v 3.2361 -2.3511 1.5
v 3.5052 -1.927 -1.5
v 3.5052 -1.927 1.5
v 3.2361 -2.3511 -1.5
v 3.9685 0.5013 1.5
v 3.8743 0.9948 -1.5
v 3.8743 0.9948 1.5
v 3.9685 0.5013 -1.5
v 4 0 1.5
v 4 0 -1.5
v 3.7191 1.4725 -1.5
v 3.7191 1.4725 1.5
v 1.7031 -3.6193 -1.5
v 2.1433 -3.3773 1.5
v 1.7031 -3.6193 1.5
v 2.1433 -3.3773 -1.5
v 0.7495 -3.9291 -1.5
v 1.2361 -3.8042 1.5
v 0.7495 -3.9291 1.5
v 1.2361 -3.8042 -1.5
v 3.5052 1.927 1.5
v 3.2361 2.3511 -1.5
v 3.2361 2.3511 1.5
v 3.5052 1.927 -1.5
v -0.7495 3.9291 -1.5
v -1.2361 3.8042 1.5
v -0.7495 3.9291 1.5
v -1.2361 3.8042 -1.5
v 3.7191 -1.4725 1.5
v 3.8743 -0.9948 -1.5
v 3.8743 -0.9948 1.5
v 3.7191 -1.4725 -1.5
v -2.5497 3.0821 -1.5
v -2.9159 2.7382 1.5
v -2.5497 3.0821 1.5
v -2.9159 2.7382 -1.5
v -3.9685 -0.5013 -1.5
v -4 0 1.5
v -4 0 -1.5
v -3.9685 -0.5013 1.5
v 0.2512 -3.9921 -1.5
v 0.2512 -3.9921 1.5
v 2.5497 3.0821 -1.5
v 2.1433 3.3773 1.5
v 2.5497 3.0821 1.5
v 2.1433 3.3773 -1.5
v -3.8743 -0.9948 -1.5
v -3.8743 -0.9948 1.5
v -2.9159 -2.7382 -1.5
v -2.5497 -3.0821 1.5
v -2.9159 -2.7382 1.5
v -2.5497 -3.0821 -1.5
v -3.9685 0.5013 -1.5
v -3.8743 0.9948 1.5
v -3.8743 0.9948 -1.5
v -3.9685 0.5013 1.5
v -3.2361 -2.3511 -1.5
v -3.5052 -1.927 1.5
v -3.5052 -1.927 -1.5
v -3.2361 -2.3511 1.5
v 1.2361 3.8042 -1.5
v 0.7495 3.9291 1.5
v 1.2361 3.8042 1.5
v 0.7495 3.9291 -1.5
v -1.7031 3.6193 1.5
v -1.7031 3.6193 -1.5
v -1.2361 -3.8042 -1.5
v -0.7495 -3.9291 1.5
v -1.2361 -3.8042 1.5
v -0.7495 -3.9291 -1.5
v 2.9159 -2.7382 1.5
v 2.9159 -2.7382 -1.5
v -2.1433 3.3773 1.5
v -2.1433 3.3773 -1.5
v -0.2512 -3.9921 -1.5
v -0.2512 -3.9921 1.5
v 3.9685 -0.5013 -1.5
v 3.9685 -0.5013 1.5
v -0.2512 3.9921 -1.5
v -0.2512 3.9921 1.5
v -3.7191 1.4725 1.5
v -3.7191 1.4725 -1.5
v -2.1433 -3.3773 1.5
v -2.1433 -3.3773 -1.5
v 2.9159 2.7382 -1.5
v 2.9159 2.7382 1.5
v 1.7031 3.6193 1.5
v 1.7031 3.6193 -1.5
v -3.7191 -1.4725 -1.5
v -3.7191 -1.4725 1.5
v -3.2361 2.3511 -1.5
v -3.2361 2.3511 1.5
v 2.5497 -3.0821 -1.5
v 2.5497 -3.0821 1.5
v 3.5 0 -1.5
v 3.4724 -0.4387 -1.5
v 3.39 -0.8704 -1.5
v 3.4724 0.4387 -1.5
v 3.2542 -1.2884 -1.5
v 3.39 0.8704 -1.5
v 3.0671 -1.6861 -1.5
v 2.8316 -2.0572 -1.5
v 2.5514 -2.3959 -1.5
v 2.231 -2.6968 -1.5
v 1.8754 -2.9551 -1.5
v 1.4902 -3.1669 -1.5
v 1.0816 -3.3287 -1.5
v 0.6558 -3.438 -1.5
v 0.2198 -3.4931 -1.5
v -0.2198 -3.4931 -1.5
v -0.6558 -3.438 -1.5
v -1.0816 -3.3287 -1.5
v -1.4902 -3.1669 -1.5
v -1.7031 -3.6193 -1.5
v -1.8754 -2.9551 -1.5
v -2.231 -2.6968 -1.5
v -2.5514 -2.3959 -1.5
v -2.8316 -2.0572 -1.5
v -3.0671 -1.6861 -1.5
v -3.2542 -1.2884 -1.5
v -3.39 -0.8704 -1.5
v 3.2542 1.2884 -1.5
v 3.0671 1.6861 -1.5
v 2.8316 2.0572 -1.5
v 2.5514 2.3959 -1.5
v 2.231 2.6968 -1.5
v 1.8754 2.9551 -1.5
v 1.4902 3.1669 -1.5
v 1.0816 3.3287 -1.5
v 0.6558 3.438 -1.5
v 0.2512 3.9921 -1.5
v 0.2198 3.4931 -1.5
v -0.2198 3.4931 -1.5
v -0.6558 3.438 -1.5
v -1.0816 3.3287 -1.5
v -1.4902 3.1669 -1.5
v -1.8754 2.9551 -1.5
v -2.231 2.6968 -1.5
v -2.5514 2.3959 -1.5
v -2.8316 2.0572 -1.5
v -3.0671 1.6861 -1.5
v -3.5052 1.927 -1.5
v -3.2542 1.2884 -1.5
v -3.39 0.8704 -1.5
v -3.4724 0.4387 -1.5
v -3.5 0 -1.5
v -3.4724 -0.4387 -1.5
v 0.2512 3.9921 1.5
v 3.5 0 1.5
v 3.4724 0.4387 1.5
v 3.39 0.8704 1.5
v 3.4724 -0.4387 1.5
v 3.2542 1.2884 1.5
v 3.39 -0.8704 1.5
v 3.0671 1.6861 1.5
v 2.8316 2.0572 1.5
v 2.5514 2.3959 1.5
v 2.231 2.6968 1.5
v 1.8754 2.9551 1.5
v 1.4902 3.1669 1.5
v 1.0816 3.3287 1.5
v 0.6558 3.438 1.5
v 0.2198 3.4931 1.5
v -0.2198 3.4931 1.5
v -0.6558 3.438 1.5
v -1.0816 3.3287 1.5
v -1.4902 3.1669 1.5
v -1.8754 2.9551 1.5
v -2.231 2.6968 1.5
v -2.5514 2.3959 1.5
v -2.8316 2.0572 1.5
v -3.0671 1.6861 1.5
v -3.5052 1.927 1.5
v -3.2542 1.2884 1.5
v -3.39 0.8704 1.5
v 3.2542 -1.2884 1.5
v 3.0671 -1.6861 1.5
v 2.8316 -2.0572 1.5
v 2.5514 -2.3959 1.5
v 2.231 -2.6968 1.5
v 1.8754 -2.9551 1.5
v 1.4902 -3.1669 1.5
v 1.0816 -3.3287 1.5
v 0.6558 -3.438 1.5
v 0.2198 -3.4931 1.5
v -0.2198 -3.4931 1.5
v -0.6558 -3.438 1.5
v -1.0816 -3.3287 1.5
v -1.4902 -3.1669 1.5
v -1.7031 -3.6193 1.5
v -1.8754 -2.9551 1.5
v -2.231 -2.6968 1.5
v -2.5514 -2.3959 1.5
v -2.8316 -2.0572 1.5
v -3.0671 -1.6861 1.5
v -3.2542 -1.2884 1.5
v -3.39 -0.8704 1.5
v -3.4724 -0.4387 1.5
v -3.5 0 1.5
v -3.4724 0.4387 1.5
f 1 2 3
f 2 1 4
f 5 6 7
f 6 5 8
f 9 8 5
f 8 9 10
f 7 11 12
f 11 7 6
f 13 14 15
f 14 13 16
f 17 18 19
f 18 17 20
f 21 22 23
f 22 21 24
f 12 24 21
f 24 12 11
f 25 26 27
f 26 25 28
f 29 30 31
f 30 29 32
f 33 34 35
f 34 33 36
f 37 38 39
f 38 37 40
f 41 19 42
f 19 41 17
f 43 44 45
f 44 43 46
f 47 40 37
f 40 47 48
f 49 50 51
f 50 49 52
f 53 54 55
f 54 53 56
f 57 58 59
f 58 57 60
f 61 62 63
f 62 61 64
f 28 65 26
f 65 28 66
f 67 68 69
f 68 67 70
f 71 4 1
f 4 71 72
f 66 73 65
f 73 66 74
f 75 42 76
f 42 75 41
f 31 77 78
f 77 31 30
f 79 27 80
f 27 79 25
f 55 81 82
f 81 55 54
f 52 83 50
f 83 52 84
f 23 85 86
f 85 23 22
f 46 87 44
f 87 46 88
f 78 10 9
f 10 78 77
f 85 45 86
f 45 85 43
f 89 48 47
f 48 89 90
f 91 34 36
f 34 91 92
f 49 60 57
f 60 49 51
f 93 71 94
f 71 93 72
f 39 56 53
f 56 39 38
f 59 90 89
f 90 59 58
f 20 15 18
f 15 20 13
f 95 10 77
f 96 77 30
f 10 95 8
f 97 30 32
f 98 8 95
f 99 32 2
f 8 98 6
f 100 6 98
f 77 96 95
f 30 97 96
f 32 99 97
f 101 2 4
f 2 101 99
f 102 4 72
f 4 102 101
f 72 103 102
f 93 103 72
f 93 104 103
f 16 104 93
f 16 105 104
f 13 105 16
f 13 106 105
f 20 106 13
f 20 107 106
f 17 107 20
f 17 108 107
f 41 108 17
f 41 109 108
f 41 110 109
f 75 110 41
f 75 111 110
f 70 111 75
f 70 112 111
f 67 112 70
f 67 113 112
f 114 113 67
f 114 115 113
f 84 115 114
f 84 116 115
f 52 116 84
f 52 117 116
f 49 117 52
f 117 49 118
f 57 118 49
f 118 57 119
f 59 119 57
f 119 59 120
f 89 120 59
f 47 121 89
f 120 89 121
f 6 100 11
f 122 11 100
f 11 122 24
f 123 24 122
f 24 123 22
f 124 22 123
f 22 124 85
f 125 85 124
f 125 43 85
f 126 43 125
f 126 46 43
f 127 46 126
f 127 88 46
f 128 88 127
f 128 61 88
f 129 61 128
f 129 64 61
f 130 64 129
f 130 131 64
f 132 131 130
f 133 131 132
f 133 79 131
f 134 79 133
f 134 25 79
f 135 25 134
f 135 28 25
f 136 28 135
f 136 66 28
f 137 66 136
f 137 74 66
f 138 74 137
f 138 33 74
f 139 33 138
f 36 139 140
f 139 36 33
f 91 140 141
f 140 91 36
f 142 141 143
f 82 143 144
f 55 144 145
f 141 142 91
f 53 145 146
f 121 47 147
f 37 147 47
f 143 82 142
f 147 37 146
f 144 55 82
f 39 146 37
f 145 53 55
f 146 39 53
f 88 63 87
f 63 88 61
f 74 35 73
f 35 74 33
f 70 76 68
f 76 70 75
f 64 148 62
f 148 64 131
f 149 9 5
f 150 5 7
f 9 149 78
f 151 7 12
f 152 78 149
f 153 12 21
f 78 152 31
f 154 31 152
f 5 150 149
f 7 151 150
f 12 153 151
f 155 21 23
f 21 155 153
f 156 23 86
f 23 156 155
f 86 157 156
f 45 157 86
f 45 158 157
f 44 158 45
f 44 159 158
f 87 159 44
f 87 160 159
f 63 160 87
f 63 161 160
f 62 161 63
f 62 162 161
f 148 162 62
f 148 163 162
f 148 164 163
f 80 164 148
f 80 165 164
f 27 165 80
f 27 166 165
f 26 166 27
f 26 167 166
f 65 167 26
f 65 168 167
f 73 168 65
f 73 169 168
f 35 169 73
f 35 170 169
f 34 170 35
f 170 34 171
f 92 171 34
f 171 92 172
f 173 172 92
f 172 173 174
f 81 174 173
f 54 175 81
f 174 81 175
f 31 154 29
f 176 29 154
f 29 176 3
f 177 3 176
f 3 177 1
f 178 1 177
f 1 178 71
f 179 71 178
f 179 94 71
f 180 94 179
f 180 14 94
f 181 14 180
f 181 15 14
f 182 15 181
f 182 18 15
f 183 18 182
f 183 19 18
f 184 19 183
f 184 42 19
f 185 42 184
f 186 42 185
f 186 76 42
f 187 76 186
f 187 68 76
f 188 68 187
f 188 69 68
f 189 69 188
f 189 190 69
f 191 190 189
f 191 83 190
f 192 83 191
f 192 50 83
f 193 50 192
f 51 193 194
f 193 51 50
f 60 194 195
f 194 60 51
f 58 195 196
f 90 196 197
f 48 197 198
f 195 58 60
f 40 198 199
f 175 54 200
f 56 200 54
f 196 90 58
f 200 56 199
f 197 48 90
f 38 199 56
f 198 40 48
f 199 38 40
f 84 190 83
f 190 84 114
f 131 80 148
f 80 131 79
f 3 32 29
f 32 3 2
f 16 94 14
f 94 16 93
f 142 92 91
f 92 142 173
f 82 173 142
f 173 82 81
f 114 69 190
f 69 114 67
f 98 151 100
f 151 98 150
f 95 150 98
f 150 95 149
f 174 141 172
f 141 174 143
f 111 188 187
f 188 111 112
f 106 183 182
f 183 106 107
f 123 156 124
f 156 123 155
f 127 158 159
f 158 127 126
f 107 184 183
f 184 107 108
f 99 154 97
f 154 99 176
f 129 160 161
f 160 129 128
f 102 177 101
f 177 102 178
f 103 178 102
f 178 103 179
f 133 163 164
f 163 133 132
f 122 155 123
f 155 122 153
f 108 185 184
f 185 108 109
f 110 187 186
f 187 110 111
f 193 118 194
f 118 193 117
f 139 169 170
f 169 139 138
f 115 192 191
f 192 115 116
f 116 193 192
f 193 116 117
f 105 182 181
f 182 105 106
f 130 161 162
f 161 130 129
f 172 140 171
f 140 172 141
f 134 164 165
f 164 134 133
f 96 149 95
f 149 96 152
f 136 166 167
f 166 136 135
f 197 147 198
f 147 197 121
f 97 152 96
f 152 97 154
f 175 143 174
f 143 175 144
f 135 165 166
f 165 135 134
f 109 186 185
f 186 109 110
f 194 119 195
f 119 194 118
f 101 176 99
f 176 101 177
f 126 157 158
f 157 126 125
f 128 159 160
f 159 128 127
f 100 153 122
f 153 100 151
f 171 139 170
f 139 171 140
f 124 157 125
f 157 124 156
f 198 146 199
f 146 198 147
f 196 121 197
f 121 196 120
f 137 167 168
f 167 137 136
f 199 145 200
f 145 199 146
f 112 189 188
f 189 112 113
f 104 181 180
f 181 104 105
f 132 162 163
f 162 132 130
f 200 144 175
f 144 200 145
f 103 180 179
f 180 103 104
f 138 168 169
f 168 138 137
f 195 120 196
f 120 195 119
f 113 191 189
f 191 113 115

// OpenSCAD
$fn = 50;


difference() {
	union() {
		translate(v = [0, 0, -1.5000000000]) {
			cylinder(h = 3, r = 4.0000000000);
		}
	}
	union() {
		translate(v = [0, 0, -100.0000000000]) {
			cylinder(h = 200, r = 3.5000000000);
		}
	}
}
